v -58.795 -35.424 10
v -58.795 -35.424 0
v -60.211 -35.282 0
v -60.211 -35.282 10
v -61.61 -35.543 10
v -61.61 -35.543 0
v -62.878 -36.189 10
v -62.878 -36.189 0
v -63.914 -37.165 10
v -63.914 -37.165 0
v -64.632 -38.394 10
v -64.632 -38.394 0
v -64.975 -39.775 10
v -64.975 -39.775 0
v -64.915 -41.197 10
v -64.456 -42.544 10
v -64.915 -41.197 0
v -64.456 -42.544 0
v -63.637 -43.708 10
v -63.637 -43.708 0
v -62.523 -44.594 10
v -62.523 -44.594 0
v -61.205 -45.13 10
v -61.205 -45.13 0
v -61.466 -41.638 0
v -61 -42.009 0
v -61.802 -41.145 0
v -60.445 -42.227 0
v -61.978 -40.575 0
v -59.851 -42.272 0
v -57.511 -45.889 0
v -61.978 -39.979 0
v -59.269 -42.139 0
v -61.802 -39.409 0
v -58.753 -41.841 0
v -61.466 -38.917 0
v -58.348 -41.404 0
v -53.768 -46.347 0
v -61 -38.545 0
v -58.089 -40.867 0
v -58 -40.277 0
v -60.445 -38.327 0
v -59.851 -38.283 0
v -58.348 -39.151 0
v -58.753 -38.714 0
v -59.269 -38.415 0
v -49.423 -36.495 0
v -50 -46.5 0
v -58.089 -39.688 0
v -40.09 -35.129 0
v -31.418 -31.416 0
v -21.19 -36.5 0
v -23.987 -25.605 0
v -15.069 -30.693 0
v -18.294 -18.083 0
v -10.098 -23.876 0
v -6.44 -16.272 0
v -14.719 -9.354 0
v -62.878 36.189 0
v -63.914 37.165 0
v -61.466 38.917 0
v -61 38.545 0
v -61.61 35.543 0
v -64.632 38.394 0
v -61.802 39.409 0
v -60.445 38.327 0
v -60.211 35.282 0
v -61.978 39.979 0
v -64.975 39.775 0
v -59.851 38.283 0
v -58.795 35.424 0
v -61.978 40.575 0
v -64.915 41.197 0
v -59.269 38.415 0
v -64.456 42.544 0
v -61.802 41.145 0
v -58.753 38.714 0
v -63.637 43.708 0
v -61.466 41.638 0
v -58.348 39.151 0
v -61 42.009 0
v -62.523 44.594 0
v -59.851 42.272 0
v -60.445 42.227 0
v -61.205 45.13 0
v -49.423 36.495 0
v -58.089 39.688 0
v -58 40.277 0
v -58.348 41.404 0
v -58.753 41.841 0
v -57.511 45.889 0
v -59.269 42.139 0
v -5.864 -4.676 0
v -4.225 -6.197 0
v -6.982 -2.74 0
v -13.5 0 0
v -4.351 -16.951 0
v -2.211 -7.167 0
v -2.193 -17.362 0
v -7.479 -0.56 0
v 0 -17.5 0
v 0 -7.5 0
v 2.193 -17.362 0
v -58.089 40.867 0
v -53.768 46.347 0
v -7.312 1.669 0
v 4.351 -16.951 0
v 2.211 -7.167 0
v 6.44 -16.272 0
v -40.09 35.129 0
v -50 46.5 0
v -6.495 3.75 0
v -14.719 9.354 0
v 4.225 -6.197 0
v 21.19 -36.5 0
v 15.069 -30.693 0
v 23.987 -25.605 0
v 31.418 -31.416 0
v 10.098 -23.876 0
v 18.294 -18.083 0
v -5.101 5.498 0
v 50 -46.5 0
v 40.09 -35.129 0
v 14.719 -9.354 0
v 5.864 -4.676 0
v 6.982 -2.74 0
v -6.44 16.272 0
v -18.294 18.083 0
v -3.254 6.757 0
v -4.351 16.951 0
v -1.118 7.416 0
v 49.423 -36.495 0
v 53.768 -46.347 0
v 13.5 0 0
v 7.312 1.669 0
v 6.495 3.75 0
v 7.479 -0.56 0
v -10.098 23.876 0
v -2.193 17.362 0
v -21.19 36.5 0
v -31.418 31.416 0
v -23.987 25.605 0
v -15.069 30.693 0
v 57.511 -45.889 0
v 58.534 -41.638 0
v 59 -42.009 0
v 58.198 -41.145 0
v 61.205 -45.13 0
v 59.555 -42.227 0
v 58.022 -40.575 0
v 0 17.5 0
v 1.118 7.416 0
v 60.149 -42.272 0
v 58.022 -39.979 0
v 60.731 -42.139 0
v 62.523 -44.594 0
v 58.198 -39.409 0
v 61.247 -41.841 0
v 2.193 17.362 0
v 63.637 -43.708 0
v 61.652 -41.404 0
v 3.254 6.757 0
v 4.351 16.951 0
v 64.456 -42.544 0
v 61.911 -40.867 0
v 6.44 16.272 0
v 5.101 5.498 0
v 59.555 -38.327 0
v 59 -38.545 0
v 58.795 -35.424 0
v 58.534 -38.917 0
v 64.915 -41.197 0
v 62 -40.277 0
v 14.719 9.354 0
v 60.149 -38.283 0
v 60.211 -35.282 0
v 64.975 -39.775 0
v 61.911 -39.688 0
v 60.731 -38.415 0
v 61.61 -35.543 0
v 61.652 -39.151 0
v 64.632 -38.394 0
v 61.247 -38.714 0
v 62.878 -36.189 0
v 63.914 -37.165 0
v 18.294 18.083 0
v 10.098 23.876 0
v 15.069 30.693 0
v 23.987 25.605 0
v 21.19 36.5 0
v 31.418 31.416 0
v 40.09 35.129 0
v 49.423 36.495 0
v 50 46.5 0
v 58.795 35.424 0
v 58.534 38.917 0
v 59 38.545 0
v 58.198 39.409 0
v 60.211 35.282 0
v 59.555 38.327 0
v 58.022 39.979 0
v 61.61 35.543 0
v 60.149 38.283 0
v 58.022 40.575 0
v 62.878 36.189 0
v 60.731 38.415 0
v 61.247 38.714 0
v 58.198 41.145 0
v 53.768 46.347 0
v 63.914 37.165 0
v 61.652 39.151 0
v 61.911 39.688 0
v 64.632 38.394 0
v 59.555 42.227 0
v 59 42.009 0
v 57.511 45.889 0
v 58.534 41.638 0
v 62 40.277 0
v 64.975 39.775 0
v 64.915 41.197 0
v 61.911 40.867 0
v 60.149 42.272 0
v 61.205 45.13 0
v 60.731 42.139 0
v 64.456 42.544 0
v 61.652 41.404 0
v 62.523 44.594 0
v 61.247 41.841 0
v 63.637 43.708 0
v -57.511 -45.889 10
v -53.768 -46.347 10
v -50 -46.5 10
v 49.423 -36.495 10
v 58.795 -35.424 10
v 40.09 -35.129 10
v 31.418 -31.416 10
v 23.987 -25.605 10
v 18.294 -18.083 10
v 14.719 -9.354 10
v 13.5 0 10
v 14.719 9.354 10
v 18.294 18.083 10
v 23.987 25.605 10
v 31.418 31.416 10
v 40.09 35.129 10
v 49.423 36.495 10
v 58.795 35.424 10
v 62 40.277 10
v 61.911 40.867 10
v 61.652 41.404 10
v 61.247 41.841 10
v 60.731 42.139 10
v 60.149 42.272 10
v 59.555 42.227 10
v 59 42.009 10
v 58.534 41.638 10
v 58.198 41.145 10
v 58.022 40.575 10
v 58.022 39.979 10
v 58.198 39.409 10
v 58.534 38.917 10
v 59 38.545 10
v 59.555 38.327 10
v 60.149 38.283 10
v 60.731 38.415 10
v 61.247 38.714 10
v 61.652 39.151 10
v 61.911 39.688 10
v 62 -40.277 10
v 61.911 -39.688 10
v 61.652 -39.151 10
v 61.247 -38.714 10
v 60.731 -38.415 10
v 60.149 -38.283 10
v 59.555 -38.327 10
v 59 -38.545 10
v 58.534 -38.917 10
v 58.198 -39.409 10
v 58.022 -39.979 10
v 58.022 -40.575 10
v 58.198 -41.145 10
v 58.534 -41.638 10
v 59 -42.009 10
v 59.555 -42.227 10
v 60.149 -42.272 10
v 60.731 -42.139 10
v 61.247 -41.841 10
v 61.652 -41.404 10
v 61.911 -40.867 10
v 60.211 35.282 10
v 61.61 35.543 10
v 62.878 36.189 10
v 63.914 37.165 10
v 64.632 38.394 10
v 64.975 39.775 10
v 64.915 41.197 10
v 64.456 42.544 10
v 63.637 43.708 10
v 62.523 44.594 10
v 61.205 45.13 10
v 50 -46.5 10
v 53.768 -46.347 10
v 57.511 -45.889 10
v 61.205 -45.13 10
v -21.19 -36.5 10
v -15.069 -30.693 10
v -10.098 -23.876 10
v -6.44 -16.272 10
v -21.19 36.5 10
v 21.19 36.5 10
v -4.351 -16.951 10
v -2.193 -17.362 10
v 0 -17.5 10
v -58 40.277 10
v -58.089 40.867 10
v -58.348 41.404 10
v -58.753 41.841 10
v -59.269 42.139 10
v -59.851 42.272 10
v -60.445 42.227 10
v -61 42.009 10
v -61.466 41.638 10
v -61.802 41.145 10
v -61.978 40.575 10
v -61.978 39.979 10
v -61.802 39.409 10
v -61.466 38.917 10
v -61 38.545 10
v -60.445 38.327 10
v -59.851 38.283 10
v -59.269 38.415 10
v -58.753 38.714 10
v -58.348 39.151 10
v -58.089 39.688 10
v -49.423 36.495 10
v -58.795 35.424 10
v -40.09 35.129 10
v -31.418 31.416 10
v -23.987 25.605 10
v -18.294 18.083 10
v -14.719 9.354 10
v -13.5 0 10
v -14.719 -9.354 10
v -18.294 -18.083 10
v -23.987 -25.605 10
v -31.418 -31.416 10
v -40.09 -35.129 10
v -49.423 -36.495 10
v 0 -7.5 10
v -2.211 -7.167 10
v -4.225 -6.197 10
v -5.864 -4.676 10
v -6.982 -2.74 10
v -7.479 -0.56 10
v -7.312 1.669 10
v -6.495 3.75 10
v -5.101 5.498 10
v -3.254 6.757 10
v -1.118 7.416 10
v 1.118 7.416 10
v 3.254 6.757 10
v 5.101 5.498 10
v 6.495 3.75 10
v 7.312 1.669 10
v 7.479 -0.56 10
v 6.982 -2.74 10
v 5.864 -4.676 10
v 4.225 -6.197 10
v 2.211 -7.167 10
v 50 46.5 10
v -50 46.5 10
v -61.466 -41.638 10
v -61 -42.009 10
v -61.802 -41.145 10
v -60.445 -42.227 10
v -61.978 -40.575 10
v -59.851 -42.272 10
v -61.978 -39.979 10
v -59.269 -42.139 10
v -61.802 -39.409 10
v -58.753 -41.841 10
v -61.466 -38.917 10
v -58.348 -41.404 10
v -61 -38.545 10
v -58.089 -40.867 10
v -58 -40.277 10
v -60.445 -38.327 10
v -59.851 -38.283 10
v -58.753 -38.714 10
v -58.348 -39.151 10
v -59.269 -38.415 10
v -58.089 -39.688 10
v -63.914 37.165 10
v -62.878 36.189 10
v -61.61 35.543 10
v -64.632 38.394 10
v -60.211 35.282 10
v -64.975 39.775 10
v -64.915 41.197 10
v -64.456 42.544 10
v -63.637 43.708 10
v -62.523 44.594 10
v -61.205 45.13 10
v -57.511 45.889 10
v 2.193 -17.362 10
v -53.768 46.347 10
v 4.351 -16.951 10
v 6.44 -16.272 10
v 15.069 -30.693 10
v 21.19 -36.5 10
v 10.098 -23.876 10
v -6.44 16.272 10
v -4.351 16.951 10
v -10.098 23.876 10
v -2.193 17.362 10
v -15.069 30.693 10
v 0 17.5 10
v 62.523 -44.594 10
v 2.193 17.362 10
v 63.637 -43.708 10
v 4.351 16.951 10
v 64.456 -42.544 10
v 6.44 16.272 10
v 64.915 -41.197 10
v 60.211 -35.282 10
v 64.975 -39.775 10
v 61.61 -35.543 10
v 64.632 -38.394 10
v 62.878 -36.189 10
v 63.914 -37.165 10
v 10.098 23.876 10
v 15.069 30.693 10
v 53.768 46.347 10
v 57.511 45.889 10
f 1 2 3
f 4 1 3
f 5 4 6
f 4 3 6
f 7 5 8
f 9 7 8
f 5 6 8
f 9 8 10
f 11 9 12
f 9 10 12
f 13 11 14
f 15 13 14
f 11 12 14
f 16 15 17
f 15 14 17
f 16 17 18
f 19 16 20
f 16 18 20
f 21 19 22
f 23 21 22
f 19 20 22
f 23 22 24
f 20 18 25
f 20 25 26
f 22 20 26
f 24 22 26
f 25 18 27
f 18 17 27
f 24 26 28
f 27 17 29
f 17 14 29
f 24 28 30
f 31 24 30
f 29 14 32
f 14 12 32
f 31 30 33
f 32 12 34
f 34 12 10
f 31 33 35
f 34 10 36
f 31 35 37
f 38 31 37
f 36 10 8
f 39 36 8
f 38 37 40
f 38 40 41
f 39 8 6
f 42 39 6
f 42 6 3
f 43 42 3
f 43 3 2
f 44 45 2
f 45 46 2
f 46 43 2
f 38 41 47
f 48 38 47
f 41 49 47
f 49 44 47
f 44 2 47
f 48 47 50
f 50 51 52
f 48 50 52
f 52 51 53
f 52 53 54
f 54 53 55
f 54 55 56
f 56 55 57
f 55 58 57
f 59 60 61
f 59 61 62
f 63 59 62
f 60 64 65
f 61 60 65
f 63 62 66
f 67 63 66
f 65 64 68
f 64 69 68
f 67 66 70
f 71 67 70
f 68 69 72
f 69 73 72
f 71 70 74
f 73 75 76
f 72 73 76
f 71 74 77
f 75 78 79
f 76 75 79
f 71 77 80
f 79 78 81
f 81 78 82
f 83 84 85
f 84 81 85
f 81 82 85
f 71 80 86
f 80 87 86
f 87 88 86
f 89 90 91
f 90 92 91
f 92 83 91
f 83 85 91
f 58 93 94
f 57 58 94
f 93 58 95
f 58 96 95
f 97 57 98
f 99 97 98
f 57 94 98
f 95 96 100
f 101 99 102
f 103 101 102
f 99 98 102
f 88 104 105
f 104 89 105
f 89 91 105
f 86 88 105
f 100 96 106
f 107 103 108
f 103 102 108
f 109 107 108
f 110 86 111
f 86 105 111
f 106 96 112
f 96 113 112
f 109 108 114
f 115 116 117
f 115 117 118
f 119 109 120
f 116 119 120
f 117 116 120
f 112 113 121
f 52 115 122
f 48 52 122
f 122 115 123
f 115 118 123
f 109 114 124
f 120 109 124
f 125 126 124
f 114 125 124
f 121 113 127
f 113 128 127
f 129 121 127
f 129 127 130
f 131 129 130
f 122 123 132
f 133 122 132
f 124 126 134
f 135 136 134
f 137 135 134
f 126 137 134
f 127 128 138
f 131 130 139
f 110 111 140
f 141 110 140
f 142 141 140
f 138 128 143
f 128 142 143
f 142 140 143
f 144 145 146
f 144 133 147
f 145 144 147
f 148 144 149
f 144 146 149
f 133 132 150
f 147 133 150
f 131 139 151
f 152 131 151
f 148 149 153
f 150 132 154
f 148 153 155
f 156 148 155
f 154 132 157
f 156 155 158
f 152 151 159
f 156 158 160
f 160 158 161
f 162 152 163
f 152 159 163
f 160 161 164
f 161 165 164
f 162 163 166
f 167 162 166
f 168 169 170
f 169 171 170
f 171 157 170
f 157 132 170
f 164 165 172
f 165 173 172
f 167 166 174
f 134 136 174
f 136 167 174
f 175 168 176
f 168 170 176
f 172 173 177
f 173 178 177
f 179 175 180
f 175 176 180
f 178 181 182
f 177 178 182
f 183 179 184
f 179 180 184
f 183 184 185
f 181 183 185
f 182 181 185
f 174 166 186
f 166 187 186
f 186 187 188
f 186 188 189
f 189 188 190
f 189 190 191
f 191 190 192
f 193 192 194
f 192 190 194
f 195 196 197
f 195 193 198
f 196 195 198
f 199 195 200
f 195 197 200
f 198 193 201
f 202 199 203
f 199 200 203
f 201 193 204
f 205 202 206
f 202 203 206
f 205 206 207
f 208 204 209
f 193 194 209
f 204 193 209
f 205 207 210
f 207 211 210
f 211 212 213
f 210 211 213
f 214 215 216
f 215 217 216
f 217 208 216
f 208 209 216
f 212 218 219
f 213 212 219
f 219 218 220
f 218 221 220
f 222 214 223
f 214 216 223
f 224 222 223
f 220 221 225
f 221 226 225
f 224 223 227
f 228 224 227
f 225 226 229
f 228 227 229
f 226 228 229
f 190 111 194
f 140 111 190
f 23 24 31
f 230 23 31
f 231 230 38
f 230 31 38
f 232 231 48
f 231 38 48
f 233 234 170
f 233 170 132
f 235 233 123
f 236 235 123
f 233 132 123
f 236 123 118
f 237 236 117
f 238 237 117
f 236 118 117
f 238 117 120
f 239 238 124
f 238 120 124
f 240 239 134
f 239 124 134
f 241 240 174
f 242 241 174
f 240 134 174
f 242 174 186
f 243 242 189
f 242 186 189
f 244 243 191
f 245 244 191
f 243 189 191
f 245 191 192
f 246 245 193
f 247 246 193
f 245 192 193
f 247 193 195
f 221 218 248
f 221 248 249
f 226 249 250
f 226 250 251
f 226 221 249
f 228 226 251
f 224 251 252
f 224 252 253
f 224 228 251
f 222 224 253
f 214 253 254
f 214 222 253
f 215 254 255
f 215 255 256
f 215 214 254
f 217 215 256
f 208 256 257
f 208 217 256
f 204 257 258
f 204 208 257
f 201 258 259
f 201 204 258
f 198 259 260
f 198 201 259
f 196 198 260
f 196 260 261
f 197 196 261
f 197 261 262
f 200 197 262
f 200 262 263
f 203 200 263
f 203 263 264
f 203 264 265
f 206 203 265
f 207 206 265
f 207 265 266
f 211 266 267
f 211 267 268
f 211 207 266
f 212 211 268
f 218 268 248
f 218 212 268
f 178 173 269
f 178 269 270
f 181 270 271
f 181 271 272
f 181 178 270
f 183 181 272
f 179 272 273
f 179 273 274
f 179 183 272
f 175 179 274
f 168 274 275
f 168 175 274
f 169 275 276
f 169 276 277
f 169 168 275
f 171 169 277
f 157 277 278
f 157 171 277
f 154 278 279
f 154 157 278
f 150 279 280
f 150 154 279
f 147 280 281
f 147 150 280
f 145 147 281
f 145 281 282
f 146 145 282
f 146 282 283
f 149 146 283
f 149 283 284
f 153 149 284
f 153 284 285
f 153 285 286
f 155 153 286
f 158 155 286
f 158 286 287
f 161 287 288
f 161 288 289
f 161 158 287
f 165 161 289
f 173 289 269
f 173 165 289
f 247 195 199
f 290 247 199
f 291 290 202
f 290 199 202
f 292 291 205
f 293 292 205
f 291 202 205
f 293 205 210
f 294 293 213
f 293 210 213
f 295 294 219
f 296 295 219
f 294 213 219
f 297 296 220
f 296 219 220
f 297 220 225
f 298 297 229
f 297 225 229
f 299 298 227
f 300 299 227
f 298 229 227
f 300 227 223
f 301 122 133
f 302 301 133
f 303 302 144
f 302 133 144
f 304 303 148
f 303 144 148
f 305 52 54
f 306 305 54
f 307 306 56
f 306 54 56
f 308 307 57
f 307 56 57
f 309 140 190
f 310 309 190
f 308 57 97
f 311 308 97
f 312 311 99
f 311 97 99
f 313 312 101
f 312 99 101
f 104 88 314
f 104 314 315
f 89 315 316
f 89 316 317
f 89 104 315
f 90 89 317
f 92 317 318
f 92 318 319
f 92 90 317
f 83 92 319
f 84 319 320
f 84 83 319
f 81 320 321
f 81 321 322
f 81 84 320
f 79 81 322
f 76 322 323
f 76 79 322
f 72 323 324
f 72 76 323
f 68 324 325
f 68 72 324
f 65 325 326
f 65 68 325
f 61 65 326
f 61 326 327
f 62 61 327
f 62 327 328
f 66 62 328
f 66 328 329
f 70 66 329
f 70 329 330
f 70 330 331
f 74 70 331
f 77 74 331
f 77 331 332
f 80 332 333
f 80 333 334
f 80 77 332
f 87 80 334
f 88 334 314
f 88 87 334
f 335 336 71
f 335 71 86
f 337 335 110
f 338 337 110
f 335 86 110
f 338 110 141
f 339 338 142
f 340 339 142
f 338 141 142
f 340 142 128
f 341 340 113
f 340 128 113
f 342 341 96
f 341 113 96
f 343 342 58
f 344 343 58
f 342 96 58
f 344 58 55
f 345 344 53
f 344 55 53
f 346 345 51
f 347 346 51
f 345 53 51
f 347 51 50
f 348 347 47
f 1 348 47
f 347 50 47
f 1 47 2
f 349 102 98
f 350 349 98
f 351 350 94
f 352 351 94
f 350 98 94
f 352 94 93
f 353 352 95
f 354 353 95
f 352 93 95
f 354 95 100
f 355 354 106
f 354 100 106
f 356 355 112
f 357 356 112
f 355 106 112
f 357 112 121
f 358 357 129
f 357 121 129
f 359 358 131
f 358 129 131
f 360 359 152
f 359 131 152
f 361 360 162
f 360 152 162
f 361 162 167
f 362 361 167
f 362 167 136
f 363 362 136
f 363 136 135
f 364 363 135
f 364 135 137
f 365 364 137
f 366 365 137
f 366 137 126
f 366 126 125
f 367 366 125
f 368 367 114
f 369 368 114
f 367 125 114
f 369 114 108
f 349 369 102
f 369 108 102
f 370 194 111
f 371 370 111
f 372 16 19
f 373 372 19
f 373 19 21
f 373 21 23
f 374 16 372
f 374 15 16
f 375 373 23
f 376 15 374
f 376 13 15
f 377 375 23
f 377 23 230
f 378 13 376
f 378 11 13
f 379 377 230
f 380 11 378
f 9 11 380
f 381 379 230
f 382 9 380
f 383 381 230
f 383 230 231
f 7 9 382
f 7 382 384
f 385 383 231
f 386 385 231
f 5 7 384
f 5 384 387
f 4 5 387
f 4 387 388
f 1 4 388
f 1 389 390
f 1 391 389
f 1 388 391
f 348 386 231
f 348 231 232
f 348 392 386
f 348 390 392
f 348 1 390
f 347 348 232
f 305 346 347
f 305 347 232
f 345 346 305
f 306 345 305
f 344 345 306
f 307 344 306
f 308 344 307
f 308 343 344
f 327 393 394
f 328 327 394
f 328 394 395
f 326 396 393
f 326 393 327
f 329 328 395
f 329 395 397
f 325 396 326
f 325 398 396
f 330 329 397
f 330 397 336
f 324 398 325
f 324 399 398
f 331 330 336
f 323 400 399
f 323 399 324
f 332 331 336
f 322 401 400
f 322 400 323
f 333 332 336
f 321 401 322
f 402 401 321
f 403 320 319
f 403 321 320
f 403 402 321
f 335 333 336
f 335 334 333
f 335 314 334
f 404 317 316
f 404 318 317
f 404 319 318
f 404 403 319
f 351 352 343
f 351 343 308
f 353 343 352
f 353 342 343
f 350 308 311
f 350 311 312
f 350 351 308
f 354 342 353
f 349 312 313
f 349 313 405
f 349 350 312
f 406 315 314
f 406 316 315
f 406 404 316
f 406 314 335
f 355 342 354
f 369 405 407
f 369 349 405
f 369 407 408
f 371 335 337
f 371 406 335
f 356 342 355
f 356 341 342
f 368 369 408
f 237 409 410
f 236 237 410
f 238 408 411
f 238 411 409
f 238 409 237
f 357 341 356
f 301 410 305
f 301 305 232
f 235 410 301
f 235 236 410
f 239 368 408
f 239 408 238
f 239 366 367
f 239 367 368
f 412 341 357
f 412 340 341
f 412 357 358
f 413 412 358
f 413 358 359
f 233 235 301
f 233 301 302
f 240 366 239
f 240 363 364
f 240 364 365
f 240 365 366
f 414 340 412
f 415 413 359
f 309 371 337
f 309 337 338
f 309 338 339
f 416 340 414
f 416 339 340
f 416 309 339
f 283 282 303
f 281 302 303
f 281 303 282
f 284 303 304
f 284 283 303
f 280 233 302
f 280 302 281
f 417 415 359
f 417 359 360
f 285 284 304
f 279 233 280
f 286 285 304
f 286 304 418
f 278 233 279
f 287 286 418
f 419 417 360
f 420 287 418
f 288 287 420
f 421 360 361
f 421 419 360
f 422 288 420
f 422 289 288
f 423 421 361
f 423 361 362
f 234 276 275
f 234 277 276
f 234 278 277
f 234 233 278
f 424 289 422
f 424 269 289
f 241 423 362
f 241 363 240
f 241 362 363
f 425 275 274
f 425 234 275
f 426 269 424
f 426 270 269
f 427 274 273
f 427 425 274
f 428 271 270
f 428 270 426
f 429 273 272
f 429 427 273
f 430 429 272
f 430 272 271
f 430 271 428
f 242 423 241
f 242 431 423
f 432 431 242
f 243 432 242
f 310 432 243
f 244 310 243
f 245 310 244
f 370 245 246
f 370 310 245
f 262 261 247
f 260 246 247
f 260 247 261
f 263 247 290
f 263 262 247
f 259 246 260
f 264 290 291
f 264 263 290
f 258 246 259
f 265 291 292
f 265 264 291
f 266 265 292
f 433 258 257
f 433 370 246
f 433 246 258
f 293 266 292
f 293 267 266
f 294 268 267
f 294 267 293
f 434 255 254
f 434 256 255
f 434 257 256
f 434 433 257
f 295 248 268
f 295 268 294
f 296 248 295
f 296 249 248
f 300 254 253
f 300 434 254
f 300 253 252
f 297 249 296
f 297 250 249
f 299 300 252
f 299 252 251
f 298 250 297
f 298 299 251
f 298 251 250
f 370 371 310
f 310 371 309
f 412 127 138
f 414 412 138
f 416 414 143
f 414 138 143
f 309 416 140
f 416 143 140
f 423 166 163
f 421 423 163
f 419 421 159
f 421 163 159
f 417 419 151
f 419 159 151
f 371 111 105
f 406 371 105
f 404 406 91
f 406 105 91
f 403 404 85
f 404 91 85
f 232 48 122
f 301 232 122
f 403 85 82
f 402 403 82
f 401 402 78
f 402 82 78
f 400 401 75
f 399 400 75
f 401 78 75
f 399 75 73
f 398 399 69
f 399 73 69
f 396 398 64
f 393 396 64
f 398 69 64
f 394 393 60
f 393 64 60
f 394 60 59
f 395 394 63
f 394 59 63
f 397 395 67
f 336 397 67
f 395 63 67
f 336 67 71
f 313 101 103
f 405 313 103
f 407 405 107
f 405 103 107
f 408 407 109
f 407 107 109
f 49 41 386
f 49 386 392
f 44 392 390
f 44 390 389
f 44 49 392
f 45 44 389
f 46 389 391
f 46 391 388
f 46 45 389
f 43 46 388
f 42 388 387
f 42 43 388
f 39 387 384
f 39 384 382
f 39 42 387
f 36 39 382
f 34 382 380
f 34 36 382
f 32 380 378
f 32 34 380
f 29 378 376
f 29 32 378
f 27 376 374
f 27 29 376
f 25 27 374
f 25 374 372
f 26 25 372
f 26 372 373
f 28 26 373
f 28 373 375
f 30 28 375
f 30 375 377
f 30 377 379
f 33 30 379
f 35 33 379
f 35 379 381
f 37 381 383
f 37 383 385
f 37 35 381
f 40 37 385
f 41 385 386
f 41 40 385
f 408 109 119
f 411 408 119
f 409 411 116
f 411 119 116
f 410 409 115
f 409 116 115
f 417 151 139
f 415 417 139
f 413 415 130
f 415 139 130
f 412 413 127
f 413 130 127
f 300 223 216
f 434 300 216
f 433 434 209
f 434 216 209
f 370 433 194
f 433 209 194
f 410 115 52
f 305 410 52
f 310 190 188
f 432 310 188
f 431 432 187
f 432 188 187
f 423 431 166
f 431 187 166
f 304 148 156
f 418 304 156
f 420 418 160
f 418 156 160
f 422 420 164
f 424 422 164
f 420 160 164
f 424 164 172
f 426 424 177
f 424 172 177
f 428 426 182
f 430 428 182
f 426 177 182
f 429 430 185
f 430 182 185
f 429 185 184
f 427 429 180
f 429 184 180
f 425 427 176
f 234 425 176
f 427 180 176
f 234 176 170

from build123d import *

# Parameters (mm, degrees)
F0_R     = 2
F1_DEPTH = 10


with BuildPart() as f1:
    # F0 (on Top) → F1 (new body)
    with BuildSketch(Plane.XY):
        with BuildLine():
            ThreePointArc((58.795181, -35.424494), (13.5, 0), (58.795181, 35.424494))
            ThreePointArc((58.795181, 35.424494), (64.85267, 39.072345), (61.204819, 45.129835))
            ThreePointArc((61.204819, 45.129835), (55.644141, 46.156188), (50, 46.5))
            Line((50, 46.5), (0, 46.5))
            Line((0, 46.5), (-50, 46.5))
            ThreePointArc((-50, 46.5), (-55.644141, 46.156188), (-61.204819, 45.129835))
            ThreePointArc((-61.204819, 45.129835), (-64.85267, 39.072345), (-58.795181, 35.424494))
            ThreePointArc((-58.795181, 35.424494), (-13.5, 0), (-58.795181, -35.424494))
            ThreePointArc((-58.795181, -35.424494), (-64.85267, -39.072345), (-61.204819, -45.129835))
            ThreePointArc((-61.204819, -45.129835), (-55.644141, -46.156188), (-50, -46.5))
            Line((-50, -46.5), (0, -46.5))
            Line((0, -46.5), (50, -46.5))
            ThreePointArc((50, -46.5), (55.644141, -46.156188), (61.204819, -45.129835))
            ThreePointArc((61.204819, -45.129835), (64.85267, -39.072345), (58.795181, -35.424494))
        make_face()
        with Locations((-60, -40.277165)):
            Circle(F0_R, mode=Mode.SUBTRACT)
        with BuildLine():
            ThreePointArc((0, -17.5), (3.278022, -17.190247), (6.44, -16.271951))
            ThreePointArc((6.44, -16.271951), (12.428234, -27.397306), (21.190279, -36.5))
            Line((21.190279, -36.5), (0, -36.5))
            Line((0, -36.5), (-21.190279, -36.5))
            ThreePointArc((-21.190279, -36.5), (-12.428234, -27.397306), (-6.44, -16.271951))
            ThreePointArc((-6.44, -16.271951), (-3.278022, -17.190247), (0, -17.5))
        make_face(mode=Mode.SUBTRACT)
        with Locations((60, -40.277165)):
            Circle(F0_R, mode=Mode.SUBTRACT)
        with Locations((-60, 40.277165)):
            Circle(F0_R, mode=Mode.SUBTRACT)
        with BuildLine():
            ThreePointArc((0, 7.5), (7.5, 0), (0, -7.5))
            ThreePointArc((0, -7.5), (-7.5, 0), (0, 7.5))
        make_face(mode=Mode.SUBTRACT)
        with BuildLine():
            ThreePointArc((21.190279, 36.5), (12.428234, 27.397306), (6.44, 16.271951))
            ThreePointArc((6.44, 16.271951), (3.278022, 17.190247), (0, 17.5))
            ThreePointArc((0, 17.5), (-3.278022, 17.190247), (-6.44, 16.271951))
            ThreePointArc((-6.44, 16.271951), (-12.428234, 27.397306), (-21.190279, 36.5))
            Line((-21.190279, 36.5), (0, 36.5))
            Line((0, 36.5), (21.190279, 36.5))
        make_face(mode=Mode.SUBTRACT)
        with Locations((60, 40.277165)):
            Circle(F0_R, mode=Mode.SUBTRACT)
    extrude(amount=F1_DEPTH)


solid = f1.part
